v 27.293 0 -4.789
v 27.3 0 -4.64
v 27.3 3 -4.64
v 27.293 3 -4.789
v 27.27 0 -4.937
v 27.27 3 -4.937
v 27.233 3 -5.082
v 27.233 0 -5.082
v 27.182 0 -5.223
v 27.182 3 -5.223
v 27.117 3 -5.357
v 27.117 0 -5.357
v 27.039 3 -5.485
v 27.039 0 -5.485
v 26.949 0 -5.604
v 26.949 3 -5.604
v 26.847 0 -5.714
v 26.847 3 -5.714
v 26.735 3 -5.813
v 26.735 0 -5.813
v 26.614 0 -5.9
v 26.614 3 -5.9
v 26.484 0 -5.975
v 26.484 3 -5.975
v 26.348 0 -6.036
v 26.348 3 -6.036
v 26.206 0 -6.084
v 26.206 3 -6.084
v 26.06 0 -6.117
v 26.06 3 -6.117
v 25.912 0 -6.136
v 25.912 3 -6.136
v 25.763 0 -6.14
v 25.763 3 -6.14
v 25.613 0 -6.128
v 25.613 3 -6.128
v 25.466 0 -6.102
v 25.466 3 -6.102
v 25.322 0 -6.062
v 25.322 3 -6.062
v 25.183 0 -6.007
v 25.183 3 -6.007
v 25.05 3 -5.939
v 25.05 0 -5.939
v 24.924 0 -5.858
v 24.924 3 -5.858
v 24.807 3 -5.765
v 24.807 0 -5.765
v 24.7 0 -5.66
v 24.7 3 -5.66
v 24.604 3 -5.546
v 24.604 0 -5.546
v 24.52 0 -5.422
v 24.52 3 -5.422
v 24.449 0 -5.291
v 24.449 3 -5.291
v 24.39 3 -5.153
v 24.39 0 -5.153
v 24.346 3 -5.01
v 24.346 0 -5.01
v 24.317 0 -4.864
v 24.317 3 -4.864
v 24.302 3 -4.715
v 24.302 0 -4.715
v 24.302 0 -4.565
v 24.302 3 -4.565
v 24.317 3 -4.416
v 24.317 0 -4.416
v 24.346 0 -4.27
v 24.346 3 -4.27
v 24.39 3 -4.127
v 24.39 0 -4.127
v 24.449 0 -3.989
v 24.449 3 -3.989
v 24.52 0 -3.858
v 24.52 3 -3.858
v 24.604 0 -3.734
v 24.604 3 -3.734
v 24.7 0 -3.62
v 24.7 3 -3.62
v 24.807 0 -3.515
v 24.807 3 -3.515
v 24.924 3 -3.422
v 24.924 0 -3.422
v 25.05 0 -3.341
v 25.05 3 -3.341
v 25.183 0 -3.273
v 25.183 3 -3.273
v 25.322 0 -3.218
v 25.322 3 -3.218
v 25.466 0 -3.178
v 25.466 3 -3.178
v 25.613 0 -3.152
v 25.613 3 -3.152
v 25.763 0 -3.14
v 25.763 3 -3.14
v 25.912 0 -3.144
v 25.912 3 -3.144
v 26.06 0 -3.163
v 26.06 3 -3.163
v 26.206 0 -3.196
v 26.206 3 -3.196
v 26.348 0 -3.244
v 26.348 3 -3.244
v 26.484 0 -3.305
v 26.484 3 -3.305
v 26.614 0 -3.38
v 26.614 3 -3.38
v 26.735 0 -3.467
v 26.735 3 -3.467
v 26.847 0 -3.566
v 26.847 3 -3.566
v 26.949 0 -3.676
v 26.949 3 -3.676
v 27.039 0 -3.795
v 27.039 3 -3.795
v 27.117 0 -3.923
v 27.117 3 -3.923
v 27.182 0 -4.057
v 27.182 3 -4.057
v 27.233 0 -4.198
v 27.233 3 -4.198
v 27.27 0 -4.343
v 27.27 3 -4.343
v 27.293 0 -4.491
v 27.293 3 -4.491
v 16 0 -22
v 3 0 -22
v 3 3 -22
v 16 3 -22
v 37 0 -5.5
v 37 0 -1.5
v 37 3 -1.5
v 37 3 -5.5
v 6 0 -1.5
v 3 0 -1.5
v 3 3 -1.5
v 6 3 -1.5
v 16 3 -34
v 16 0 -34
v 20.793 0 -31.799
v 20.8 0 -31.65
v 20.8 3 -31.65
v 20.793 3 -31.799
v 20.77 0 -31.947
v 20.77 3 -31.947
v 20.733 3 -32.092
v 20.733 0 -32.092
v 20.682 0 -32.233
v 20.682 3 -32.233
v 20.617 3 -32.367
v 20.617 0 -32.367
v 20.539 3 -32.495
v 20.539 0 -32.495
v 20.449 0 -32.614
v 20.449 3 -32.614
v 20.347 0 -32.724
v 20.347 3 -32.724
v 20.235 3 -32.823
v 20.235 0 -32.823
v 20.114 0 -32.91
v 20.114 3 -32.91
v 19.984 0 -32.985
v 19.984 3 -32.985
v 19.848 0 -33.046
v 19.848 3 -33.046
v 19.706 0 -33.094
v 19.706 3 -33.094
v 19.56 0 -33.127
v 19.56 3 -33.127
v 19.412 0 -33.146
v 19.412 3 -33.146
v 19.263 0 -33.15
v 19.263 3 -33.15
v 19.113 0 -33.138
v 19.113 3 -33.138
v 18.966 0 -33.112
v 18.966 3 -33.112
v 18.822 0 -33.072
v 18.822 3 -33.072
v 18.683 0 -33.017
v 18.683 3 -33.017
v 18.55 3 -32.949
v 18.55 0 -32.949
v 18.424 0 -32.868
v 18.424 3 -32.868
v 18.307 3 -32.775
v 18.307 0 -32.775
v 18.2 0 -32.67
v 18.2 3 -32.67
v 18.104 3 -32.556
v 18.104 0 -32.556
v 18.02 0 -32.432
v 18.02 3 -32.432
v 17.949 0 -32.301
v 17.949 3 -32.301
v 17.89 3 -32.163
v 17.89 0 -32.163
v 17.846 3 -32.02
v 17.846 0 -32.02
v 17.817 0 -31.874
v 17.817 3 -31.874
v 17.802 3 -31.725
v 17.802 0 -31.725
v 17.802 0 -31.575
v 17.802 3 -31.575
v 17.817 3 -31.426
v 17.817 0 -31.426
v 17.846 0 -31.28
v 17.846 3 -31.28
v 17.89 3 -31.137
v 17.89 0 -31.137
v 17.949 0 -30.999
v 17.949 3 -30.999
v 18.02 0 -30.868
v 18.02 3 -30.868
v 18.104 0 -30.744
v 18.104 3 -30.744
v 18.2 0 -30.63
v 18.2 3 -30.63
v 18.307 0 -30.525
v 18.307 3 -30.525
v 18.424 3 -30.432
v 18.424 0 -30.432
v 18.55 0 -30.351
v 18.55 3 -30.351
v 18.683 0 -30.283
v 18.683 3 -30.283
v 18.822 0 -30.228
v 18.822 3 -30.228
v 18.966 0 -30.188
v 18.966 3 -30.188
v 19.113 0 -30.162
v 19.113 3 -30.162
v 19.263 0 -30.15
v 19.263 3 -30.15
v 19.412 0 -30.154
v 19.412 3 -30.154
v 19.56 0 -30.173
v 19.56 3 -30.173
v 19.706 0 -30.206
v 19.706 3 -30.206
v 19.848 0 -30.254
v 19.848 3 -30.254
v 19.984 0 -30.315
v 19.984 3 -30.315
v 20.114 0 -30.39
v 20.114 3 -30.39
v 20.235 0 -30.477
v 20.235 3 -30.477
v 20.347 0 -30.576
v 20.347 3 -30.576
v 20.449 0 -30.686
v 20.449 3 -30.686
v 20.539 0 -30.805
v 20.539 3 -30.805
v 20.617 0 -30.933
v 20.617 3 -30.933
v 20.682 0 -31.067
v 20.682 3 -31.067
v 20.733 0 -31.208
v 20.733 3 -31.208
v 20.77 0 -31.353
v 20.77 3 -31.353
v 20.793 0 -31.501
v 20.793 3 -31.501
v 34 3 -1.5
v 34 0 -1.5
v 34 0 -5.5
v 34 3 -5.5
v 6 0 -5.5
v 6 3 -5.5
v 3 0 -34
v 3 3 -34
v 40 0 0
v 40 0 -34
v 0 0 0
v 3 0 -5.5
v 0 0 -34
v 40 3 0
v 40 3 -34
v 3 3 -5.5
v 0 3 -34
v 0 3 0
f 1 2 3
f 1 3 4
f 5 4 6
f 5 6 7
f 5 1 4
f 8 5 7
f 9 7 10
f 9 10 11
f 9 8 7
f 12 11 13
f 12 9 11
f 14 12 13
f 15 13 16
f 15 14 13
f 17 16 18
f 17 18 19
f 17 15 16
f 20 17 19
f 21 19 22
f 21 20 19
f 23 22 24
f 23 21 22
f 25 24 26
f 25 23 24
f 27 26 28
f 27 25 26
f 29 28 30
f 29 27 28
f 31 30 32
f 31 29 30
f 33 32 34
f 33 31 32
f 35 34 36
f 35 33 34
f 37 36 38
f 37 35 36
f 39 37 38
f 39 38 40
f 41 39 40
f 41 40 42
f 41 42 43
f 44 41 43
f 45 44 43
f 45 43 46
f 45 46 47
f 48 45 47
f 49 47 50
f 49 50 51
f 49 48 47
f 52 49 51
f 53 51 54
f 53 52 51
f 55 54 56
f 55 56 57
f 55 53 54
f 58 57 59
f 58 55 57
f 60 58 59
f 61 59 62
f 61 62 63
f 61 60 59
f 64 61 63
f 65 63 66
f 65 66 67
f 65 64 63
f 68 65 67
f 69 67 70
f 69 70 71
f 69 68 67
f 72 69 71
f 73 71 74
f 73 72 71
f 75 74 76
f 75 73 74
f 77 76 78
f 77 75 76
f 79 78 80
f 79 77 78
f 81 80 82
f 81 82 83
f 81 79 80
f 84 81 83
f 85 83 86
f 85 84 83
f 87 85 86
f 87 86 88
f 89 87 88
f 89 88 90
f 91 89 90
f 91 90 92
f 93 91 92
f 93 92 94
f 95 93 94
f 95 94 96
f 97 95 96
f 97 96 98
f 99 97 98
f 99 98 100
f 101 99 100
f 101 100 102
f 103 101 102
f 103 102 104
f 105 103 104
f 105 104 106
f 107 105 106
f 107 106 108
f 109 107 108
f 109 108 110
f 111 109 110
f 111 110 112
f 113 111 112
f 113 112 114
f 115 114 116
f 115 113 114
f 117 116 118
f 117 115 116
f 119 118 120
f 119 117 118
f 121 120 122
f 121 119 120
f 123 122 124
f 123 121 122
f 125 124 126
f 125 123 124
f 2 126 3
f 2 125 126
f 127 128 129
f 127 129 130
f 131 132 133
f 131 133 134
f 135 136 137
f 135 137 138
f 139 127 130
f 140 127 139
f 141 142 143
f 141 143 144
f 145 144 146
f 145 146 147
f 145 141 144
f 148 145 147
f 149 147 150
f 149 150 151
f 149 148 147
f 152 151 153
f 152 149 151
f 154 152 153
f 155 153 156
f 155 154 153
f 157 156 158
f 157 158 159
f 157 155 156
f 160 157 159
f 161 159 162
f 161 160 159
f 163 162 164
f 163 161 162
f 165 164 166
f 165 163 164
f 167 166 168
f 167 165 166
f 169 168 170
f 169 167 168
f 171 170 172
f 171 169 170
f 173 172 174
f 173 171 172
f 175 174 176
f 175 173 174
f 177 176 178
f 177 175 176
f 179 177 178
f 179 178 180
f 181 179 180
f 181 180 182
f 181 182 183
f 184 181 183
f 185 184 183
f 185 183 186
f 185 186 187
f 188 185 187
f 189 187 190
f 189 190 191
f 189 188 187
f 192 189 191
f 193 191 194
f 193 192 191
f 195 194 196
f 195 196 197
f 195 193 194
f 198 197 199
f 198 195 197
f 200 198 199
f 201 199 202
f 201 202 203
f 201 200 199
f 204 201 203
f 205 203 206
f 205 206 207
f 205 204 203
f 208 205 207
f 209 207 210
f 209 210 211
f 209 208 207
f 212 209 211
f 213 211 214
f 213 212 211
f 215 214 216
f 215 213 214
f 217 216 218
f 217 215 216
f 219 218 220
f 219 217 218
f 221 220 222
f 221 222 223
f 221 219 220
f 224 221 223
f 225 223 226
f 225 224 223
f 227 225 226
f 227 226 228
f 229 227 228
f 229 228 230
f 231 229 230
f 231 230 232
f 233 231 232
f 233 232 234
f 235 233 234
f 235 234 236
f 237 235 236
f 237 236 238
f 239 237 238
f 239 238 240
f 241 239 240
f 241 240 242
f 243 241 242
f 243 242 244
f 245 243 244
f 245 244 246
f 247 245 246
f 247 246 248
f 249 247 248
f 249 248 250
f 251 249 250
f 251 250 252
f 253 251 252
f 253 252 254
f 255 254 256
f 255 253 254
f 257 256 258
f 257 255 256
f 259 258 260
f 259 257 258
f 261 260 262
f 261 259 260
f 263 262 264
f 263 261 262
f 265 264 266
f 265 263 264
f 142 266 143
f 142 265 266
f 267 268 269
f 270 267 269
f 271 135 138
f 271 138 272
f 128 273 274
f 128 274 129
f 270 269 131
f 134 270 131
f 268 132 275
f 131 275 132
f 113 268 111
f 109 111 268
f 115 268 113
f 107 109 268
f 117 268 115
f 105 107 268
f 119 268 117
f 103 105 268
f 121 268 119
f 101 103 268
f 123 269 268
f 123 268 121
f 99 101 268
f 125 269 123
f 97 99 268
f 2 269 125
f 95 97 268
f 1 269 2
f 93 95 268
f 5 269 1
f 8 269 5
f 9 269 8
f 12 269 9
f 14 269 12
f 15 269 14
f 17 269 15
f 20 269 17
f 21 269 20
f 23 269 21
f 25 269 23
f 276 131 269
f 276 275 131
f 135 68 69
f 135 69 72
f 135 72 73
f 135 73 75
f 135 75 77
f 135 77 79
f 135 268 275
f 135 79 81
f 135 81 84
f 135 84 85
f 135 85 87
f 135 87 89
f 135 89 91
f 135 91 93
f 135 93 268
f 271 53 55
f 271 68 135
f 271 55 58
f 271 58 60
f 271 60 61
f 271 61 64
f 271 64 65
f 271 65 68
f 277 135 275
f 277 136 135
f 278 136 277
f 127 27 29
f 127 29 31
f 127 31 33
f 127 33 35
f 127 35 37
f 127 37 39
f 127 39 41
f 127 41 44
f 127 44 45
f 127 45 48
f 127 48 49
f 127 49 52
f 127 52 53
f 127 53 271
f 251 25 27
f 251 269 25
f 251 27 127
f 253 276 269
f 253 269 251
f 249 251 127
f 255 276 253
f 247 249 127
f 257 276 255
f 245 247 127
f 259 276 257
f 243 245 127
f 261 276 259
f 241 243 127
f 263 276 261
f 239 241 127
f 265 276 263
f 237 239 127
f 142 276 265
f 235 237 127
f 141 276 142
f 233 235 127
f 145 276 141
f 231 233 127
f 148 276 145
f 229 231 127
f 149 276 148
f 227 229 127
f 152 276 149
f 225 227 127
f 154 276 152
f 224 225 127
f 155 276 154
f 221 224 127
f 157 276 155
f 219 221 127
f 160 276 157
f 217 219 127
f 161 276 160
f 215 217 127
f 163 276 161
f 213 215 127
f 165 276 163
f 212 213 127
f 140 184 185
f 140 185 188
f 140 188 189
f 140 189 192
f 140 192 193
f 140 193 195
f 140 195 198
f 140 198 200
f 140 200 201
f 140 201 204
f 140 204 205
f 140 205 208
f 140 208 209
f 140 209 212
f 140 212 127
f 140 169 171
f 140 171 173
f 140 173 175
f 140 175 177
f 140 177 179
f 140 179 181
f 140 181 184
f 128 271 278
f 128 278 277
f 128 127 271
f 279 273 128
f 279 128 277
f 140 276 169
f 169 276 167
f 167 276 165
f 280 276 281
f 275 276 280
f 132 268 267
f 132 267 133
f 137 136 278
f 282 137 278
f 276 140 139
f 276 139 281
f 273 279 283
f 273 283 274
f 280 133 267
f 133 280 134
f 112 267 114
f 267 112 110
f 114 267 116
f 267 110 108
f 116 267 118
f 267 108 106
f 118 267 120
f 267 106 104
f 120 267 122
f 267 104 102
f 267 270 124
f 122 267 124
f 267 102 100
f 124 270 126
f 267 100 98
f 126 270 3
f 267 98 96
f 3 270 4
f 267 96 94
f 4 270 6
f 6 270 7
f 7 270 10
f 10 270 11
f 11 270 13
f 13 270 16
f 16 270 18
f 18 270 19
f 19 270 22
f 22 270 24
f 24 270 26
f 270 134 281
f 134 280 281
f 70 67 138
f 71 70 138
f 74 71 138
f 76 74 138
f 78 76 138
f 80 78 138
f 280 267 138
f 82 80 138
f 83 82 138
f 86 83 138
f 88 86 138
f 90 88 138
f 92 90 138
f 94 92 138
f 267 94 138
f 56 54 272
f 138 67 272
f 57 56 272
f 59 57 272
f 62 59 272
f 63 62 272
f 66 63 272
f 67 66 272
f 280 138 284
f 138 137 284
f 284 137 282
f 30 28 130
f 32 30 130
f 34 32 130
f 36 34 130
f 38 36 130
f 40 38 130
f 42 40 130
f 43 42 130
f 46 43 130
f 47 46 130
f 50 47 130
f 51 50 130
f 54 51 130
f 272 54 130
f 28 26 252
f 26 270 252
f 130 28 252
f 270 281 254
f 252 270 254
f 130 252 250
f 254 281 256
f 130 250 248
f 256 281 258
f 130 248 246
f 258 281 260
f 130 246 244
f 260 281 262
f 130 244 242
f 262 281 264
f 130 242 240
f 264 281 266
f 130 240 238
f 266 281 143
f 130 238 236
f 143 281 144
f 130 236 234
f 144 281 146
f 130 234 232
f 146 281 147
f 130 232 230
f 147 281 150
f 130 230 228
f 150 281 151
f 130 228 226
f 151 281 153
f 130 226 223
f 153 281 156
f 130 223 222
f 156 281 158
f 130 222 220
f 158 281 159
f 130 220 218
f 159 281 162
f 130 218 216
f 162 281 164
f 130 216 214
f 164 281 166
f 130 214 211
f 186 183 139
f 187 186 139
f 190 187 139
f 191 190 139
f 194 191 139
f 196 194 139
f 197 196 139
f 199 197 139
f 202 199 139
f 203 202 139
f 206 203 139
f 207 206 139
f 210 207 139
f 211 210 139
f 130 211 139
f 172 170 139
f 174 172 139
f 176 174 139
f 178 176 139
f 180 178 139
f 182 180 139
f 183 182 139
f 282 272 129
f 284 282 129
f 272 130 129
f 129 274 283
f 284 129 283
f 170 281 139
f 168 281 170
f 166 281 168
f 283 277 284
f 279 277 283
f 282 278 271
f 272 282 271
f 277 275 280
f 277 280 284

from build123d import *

# Parameters (mm, degrees)
SKETCH1_R           = 1.5
SKETCH1_W           = 3
SKETCH1_H           = 4
BOSS_EXTRUDE1_DEPTH = 3


with BuildPart() as part:
    # Sketch1 → Boss-Extrude1 (new body)
    with BuildSketch(Plane(origin=(0, 0, 0), x_dir=(1, 0, 0), z_dir=(0, 1, 0))):
        Polygon((16, 34), (40, 34), (40, 0), (0, 0), (0, 34), (3, 34), (3, 22), (16, 22), align=None)
        with Locations((19.3, 31.65)):
            Circle(SKETCH1_R, mode=Mode.SUBTRACT)
        with Locations((25.8, 4.64)):
            Circle(SKETCH1_R, mode=Mode.SUBTRACT)
        with Locations((4.5, 3.5)):
            Rectangle(SKETCH1_W, SKETCH1_H, mode=Mode.SUBTRACT)
        with Locations((35.5, 3.5)):
            Rectangle(SKETCH1_W, SKETCH1_H, mode=Mode.SUBTRACT)
    extrude(amount=BOSS_EXTRUDE1_DEPTH)


solid = part.part
